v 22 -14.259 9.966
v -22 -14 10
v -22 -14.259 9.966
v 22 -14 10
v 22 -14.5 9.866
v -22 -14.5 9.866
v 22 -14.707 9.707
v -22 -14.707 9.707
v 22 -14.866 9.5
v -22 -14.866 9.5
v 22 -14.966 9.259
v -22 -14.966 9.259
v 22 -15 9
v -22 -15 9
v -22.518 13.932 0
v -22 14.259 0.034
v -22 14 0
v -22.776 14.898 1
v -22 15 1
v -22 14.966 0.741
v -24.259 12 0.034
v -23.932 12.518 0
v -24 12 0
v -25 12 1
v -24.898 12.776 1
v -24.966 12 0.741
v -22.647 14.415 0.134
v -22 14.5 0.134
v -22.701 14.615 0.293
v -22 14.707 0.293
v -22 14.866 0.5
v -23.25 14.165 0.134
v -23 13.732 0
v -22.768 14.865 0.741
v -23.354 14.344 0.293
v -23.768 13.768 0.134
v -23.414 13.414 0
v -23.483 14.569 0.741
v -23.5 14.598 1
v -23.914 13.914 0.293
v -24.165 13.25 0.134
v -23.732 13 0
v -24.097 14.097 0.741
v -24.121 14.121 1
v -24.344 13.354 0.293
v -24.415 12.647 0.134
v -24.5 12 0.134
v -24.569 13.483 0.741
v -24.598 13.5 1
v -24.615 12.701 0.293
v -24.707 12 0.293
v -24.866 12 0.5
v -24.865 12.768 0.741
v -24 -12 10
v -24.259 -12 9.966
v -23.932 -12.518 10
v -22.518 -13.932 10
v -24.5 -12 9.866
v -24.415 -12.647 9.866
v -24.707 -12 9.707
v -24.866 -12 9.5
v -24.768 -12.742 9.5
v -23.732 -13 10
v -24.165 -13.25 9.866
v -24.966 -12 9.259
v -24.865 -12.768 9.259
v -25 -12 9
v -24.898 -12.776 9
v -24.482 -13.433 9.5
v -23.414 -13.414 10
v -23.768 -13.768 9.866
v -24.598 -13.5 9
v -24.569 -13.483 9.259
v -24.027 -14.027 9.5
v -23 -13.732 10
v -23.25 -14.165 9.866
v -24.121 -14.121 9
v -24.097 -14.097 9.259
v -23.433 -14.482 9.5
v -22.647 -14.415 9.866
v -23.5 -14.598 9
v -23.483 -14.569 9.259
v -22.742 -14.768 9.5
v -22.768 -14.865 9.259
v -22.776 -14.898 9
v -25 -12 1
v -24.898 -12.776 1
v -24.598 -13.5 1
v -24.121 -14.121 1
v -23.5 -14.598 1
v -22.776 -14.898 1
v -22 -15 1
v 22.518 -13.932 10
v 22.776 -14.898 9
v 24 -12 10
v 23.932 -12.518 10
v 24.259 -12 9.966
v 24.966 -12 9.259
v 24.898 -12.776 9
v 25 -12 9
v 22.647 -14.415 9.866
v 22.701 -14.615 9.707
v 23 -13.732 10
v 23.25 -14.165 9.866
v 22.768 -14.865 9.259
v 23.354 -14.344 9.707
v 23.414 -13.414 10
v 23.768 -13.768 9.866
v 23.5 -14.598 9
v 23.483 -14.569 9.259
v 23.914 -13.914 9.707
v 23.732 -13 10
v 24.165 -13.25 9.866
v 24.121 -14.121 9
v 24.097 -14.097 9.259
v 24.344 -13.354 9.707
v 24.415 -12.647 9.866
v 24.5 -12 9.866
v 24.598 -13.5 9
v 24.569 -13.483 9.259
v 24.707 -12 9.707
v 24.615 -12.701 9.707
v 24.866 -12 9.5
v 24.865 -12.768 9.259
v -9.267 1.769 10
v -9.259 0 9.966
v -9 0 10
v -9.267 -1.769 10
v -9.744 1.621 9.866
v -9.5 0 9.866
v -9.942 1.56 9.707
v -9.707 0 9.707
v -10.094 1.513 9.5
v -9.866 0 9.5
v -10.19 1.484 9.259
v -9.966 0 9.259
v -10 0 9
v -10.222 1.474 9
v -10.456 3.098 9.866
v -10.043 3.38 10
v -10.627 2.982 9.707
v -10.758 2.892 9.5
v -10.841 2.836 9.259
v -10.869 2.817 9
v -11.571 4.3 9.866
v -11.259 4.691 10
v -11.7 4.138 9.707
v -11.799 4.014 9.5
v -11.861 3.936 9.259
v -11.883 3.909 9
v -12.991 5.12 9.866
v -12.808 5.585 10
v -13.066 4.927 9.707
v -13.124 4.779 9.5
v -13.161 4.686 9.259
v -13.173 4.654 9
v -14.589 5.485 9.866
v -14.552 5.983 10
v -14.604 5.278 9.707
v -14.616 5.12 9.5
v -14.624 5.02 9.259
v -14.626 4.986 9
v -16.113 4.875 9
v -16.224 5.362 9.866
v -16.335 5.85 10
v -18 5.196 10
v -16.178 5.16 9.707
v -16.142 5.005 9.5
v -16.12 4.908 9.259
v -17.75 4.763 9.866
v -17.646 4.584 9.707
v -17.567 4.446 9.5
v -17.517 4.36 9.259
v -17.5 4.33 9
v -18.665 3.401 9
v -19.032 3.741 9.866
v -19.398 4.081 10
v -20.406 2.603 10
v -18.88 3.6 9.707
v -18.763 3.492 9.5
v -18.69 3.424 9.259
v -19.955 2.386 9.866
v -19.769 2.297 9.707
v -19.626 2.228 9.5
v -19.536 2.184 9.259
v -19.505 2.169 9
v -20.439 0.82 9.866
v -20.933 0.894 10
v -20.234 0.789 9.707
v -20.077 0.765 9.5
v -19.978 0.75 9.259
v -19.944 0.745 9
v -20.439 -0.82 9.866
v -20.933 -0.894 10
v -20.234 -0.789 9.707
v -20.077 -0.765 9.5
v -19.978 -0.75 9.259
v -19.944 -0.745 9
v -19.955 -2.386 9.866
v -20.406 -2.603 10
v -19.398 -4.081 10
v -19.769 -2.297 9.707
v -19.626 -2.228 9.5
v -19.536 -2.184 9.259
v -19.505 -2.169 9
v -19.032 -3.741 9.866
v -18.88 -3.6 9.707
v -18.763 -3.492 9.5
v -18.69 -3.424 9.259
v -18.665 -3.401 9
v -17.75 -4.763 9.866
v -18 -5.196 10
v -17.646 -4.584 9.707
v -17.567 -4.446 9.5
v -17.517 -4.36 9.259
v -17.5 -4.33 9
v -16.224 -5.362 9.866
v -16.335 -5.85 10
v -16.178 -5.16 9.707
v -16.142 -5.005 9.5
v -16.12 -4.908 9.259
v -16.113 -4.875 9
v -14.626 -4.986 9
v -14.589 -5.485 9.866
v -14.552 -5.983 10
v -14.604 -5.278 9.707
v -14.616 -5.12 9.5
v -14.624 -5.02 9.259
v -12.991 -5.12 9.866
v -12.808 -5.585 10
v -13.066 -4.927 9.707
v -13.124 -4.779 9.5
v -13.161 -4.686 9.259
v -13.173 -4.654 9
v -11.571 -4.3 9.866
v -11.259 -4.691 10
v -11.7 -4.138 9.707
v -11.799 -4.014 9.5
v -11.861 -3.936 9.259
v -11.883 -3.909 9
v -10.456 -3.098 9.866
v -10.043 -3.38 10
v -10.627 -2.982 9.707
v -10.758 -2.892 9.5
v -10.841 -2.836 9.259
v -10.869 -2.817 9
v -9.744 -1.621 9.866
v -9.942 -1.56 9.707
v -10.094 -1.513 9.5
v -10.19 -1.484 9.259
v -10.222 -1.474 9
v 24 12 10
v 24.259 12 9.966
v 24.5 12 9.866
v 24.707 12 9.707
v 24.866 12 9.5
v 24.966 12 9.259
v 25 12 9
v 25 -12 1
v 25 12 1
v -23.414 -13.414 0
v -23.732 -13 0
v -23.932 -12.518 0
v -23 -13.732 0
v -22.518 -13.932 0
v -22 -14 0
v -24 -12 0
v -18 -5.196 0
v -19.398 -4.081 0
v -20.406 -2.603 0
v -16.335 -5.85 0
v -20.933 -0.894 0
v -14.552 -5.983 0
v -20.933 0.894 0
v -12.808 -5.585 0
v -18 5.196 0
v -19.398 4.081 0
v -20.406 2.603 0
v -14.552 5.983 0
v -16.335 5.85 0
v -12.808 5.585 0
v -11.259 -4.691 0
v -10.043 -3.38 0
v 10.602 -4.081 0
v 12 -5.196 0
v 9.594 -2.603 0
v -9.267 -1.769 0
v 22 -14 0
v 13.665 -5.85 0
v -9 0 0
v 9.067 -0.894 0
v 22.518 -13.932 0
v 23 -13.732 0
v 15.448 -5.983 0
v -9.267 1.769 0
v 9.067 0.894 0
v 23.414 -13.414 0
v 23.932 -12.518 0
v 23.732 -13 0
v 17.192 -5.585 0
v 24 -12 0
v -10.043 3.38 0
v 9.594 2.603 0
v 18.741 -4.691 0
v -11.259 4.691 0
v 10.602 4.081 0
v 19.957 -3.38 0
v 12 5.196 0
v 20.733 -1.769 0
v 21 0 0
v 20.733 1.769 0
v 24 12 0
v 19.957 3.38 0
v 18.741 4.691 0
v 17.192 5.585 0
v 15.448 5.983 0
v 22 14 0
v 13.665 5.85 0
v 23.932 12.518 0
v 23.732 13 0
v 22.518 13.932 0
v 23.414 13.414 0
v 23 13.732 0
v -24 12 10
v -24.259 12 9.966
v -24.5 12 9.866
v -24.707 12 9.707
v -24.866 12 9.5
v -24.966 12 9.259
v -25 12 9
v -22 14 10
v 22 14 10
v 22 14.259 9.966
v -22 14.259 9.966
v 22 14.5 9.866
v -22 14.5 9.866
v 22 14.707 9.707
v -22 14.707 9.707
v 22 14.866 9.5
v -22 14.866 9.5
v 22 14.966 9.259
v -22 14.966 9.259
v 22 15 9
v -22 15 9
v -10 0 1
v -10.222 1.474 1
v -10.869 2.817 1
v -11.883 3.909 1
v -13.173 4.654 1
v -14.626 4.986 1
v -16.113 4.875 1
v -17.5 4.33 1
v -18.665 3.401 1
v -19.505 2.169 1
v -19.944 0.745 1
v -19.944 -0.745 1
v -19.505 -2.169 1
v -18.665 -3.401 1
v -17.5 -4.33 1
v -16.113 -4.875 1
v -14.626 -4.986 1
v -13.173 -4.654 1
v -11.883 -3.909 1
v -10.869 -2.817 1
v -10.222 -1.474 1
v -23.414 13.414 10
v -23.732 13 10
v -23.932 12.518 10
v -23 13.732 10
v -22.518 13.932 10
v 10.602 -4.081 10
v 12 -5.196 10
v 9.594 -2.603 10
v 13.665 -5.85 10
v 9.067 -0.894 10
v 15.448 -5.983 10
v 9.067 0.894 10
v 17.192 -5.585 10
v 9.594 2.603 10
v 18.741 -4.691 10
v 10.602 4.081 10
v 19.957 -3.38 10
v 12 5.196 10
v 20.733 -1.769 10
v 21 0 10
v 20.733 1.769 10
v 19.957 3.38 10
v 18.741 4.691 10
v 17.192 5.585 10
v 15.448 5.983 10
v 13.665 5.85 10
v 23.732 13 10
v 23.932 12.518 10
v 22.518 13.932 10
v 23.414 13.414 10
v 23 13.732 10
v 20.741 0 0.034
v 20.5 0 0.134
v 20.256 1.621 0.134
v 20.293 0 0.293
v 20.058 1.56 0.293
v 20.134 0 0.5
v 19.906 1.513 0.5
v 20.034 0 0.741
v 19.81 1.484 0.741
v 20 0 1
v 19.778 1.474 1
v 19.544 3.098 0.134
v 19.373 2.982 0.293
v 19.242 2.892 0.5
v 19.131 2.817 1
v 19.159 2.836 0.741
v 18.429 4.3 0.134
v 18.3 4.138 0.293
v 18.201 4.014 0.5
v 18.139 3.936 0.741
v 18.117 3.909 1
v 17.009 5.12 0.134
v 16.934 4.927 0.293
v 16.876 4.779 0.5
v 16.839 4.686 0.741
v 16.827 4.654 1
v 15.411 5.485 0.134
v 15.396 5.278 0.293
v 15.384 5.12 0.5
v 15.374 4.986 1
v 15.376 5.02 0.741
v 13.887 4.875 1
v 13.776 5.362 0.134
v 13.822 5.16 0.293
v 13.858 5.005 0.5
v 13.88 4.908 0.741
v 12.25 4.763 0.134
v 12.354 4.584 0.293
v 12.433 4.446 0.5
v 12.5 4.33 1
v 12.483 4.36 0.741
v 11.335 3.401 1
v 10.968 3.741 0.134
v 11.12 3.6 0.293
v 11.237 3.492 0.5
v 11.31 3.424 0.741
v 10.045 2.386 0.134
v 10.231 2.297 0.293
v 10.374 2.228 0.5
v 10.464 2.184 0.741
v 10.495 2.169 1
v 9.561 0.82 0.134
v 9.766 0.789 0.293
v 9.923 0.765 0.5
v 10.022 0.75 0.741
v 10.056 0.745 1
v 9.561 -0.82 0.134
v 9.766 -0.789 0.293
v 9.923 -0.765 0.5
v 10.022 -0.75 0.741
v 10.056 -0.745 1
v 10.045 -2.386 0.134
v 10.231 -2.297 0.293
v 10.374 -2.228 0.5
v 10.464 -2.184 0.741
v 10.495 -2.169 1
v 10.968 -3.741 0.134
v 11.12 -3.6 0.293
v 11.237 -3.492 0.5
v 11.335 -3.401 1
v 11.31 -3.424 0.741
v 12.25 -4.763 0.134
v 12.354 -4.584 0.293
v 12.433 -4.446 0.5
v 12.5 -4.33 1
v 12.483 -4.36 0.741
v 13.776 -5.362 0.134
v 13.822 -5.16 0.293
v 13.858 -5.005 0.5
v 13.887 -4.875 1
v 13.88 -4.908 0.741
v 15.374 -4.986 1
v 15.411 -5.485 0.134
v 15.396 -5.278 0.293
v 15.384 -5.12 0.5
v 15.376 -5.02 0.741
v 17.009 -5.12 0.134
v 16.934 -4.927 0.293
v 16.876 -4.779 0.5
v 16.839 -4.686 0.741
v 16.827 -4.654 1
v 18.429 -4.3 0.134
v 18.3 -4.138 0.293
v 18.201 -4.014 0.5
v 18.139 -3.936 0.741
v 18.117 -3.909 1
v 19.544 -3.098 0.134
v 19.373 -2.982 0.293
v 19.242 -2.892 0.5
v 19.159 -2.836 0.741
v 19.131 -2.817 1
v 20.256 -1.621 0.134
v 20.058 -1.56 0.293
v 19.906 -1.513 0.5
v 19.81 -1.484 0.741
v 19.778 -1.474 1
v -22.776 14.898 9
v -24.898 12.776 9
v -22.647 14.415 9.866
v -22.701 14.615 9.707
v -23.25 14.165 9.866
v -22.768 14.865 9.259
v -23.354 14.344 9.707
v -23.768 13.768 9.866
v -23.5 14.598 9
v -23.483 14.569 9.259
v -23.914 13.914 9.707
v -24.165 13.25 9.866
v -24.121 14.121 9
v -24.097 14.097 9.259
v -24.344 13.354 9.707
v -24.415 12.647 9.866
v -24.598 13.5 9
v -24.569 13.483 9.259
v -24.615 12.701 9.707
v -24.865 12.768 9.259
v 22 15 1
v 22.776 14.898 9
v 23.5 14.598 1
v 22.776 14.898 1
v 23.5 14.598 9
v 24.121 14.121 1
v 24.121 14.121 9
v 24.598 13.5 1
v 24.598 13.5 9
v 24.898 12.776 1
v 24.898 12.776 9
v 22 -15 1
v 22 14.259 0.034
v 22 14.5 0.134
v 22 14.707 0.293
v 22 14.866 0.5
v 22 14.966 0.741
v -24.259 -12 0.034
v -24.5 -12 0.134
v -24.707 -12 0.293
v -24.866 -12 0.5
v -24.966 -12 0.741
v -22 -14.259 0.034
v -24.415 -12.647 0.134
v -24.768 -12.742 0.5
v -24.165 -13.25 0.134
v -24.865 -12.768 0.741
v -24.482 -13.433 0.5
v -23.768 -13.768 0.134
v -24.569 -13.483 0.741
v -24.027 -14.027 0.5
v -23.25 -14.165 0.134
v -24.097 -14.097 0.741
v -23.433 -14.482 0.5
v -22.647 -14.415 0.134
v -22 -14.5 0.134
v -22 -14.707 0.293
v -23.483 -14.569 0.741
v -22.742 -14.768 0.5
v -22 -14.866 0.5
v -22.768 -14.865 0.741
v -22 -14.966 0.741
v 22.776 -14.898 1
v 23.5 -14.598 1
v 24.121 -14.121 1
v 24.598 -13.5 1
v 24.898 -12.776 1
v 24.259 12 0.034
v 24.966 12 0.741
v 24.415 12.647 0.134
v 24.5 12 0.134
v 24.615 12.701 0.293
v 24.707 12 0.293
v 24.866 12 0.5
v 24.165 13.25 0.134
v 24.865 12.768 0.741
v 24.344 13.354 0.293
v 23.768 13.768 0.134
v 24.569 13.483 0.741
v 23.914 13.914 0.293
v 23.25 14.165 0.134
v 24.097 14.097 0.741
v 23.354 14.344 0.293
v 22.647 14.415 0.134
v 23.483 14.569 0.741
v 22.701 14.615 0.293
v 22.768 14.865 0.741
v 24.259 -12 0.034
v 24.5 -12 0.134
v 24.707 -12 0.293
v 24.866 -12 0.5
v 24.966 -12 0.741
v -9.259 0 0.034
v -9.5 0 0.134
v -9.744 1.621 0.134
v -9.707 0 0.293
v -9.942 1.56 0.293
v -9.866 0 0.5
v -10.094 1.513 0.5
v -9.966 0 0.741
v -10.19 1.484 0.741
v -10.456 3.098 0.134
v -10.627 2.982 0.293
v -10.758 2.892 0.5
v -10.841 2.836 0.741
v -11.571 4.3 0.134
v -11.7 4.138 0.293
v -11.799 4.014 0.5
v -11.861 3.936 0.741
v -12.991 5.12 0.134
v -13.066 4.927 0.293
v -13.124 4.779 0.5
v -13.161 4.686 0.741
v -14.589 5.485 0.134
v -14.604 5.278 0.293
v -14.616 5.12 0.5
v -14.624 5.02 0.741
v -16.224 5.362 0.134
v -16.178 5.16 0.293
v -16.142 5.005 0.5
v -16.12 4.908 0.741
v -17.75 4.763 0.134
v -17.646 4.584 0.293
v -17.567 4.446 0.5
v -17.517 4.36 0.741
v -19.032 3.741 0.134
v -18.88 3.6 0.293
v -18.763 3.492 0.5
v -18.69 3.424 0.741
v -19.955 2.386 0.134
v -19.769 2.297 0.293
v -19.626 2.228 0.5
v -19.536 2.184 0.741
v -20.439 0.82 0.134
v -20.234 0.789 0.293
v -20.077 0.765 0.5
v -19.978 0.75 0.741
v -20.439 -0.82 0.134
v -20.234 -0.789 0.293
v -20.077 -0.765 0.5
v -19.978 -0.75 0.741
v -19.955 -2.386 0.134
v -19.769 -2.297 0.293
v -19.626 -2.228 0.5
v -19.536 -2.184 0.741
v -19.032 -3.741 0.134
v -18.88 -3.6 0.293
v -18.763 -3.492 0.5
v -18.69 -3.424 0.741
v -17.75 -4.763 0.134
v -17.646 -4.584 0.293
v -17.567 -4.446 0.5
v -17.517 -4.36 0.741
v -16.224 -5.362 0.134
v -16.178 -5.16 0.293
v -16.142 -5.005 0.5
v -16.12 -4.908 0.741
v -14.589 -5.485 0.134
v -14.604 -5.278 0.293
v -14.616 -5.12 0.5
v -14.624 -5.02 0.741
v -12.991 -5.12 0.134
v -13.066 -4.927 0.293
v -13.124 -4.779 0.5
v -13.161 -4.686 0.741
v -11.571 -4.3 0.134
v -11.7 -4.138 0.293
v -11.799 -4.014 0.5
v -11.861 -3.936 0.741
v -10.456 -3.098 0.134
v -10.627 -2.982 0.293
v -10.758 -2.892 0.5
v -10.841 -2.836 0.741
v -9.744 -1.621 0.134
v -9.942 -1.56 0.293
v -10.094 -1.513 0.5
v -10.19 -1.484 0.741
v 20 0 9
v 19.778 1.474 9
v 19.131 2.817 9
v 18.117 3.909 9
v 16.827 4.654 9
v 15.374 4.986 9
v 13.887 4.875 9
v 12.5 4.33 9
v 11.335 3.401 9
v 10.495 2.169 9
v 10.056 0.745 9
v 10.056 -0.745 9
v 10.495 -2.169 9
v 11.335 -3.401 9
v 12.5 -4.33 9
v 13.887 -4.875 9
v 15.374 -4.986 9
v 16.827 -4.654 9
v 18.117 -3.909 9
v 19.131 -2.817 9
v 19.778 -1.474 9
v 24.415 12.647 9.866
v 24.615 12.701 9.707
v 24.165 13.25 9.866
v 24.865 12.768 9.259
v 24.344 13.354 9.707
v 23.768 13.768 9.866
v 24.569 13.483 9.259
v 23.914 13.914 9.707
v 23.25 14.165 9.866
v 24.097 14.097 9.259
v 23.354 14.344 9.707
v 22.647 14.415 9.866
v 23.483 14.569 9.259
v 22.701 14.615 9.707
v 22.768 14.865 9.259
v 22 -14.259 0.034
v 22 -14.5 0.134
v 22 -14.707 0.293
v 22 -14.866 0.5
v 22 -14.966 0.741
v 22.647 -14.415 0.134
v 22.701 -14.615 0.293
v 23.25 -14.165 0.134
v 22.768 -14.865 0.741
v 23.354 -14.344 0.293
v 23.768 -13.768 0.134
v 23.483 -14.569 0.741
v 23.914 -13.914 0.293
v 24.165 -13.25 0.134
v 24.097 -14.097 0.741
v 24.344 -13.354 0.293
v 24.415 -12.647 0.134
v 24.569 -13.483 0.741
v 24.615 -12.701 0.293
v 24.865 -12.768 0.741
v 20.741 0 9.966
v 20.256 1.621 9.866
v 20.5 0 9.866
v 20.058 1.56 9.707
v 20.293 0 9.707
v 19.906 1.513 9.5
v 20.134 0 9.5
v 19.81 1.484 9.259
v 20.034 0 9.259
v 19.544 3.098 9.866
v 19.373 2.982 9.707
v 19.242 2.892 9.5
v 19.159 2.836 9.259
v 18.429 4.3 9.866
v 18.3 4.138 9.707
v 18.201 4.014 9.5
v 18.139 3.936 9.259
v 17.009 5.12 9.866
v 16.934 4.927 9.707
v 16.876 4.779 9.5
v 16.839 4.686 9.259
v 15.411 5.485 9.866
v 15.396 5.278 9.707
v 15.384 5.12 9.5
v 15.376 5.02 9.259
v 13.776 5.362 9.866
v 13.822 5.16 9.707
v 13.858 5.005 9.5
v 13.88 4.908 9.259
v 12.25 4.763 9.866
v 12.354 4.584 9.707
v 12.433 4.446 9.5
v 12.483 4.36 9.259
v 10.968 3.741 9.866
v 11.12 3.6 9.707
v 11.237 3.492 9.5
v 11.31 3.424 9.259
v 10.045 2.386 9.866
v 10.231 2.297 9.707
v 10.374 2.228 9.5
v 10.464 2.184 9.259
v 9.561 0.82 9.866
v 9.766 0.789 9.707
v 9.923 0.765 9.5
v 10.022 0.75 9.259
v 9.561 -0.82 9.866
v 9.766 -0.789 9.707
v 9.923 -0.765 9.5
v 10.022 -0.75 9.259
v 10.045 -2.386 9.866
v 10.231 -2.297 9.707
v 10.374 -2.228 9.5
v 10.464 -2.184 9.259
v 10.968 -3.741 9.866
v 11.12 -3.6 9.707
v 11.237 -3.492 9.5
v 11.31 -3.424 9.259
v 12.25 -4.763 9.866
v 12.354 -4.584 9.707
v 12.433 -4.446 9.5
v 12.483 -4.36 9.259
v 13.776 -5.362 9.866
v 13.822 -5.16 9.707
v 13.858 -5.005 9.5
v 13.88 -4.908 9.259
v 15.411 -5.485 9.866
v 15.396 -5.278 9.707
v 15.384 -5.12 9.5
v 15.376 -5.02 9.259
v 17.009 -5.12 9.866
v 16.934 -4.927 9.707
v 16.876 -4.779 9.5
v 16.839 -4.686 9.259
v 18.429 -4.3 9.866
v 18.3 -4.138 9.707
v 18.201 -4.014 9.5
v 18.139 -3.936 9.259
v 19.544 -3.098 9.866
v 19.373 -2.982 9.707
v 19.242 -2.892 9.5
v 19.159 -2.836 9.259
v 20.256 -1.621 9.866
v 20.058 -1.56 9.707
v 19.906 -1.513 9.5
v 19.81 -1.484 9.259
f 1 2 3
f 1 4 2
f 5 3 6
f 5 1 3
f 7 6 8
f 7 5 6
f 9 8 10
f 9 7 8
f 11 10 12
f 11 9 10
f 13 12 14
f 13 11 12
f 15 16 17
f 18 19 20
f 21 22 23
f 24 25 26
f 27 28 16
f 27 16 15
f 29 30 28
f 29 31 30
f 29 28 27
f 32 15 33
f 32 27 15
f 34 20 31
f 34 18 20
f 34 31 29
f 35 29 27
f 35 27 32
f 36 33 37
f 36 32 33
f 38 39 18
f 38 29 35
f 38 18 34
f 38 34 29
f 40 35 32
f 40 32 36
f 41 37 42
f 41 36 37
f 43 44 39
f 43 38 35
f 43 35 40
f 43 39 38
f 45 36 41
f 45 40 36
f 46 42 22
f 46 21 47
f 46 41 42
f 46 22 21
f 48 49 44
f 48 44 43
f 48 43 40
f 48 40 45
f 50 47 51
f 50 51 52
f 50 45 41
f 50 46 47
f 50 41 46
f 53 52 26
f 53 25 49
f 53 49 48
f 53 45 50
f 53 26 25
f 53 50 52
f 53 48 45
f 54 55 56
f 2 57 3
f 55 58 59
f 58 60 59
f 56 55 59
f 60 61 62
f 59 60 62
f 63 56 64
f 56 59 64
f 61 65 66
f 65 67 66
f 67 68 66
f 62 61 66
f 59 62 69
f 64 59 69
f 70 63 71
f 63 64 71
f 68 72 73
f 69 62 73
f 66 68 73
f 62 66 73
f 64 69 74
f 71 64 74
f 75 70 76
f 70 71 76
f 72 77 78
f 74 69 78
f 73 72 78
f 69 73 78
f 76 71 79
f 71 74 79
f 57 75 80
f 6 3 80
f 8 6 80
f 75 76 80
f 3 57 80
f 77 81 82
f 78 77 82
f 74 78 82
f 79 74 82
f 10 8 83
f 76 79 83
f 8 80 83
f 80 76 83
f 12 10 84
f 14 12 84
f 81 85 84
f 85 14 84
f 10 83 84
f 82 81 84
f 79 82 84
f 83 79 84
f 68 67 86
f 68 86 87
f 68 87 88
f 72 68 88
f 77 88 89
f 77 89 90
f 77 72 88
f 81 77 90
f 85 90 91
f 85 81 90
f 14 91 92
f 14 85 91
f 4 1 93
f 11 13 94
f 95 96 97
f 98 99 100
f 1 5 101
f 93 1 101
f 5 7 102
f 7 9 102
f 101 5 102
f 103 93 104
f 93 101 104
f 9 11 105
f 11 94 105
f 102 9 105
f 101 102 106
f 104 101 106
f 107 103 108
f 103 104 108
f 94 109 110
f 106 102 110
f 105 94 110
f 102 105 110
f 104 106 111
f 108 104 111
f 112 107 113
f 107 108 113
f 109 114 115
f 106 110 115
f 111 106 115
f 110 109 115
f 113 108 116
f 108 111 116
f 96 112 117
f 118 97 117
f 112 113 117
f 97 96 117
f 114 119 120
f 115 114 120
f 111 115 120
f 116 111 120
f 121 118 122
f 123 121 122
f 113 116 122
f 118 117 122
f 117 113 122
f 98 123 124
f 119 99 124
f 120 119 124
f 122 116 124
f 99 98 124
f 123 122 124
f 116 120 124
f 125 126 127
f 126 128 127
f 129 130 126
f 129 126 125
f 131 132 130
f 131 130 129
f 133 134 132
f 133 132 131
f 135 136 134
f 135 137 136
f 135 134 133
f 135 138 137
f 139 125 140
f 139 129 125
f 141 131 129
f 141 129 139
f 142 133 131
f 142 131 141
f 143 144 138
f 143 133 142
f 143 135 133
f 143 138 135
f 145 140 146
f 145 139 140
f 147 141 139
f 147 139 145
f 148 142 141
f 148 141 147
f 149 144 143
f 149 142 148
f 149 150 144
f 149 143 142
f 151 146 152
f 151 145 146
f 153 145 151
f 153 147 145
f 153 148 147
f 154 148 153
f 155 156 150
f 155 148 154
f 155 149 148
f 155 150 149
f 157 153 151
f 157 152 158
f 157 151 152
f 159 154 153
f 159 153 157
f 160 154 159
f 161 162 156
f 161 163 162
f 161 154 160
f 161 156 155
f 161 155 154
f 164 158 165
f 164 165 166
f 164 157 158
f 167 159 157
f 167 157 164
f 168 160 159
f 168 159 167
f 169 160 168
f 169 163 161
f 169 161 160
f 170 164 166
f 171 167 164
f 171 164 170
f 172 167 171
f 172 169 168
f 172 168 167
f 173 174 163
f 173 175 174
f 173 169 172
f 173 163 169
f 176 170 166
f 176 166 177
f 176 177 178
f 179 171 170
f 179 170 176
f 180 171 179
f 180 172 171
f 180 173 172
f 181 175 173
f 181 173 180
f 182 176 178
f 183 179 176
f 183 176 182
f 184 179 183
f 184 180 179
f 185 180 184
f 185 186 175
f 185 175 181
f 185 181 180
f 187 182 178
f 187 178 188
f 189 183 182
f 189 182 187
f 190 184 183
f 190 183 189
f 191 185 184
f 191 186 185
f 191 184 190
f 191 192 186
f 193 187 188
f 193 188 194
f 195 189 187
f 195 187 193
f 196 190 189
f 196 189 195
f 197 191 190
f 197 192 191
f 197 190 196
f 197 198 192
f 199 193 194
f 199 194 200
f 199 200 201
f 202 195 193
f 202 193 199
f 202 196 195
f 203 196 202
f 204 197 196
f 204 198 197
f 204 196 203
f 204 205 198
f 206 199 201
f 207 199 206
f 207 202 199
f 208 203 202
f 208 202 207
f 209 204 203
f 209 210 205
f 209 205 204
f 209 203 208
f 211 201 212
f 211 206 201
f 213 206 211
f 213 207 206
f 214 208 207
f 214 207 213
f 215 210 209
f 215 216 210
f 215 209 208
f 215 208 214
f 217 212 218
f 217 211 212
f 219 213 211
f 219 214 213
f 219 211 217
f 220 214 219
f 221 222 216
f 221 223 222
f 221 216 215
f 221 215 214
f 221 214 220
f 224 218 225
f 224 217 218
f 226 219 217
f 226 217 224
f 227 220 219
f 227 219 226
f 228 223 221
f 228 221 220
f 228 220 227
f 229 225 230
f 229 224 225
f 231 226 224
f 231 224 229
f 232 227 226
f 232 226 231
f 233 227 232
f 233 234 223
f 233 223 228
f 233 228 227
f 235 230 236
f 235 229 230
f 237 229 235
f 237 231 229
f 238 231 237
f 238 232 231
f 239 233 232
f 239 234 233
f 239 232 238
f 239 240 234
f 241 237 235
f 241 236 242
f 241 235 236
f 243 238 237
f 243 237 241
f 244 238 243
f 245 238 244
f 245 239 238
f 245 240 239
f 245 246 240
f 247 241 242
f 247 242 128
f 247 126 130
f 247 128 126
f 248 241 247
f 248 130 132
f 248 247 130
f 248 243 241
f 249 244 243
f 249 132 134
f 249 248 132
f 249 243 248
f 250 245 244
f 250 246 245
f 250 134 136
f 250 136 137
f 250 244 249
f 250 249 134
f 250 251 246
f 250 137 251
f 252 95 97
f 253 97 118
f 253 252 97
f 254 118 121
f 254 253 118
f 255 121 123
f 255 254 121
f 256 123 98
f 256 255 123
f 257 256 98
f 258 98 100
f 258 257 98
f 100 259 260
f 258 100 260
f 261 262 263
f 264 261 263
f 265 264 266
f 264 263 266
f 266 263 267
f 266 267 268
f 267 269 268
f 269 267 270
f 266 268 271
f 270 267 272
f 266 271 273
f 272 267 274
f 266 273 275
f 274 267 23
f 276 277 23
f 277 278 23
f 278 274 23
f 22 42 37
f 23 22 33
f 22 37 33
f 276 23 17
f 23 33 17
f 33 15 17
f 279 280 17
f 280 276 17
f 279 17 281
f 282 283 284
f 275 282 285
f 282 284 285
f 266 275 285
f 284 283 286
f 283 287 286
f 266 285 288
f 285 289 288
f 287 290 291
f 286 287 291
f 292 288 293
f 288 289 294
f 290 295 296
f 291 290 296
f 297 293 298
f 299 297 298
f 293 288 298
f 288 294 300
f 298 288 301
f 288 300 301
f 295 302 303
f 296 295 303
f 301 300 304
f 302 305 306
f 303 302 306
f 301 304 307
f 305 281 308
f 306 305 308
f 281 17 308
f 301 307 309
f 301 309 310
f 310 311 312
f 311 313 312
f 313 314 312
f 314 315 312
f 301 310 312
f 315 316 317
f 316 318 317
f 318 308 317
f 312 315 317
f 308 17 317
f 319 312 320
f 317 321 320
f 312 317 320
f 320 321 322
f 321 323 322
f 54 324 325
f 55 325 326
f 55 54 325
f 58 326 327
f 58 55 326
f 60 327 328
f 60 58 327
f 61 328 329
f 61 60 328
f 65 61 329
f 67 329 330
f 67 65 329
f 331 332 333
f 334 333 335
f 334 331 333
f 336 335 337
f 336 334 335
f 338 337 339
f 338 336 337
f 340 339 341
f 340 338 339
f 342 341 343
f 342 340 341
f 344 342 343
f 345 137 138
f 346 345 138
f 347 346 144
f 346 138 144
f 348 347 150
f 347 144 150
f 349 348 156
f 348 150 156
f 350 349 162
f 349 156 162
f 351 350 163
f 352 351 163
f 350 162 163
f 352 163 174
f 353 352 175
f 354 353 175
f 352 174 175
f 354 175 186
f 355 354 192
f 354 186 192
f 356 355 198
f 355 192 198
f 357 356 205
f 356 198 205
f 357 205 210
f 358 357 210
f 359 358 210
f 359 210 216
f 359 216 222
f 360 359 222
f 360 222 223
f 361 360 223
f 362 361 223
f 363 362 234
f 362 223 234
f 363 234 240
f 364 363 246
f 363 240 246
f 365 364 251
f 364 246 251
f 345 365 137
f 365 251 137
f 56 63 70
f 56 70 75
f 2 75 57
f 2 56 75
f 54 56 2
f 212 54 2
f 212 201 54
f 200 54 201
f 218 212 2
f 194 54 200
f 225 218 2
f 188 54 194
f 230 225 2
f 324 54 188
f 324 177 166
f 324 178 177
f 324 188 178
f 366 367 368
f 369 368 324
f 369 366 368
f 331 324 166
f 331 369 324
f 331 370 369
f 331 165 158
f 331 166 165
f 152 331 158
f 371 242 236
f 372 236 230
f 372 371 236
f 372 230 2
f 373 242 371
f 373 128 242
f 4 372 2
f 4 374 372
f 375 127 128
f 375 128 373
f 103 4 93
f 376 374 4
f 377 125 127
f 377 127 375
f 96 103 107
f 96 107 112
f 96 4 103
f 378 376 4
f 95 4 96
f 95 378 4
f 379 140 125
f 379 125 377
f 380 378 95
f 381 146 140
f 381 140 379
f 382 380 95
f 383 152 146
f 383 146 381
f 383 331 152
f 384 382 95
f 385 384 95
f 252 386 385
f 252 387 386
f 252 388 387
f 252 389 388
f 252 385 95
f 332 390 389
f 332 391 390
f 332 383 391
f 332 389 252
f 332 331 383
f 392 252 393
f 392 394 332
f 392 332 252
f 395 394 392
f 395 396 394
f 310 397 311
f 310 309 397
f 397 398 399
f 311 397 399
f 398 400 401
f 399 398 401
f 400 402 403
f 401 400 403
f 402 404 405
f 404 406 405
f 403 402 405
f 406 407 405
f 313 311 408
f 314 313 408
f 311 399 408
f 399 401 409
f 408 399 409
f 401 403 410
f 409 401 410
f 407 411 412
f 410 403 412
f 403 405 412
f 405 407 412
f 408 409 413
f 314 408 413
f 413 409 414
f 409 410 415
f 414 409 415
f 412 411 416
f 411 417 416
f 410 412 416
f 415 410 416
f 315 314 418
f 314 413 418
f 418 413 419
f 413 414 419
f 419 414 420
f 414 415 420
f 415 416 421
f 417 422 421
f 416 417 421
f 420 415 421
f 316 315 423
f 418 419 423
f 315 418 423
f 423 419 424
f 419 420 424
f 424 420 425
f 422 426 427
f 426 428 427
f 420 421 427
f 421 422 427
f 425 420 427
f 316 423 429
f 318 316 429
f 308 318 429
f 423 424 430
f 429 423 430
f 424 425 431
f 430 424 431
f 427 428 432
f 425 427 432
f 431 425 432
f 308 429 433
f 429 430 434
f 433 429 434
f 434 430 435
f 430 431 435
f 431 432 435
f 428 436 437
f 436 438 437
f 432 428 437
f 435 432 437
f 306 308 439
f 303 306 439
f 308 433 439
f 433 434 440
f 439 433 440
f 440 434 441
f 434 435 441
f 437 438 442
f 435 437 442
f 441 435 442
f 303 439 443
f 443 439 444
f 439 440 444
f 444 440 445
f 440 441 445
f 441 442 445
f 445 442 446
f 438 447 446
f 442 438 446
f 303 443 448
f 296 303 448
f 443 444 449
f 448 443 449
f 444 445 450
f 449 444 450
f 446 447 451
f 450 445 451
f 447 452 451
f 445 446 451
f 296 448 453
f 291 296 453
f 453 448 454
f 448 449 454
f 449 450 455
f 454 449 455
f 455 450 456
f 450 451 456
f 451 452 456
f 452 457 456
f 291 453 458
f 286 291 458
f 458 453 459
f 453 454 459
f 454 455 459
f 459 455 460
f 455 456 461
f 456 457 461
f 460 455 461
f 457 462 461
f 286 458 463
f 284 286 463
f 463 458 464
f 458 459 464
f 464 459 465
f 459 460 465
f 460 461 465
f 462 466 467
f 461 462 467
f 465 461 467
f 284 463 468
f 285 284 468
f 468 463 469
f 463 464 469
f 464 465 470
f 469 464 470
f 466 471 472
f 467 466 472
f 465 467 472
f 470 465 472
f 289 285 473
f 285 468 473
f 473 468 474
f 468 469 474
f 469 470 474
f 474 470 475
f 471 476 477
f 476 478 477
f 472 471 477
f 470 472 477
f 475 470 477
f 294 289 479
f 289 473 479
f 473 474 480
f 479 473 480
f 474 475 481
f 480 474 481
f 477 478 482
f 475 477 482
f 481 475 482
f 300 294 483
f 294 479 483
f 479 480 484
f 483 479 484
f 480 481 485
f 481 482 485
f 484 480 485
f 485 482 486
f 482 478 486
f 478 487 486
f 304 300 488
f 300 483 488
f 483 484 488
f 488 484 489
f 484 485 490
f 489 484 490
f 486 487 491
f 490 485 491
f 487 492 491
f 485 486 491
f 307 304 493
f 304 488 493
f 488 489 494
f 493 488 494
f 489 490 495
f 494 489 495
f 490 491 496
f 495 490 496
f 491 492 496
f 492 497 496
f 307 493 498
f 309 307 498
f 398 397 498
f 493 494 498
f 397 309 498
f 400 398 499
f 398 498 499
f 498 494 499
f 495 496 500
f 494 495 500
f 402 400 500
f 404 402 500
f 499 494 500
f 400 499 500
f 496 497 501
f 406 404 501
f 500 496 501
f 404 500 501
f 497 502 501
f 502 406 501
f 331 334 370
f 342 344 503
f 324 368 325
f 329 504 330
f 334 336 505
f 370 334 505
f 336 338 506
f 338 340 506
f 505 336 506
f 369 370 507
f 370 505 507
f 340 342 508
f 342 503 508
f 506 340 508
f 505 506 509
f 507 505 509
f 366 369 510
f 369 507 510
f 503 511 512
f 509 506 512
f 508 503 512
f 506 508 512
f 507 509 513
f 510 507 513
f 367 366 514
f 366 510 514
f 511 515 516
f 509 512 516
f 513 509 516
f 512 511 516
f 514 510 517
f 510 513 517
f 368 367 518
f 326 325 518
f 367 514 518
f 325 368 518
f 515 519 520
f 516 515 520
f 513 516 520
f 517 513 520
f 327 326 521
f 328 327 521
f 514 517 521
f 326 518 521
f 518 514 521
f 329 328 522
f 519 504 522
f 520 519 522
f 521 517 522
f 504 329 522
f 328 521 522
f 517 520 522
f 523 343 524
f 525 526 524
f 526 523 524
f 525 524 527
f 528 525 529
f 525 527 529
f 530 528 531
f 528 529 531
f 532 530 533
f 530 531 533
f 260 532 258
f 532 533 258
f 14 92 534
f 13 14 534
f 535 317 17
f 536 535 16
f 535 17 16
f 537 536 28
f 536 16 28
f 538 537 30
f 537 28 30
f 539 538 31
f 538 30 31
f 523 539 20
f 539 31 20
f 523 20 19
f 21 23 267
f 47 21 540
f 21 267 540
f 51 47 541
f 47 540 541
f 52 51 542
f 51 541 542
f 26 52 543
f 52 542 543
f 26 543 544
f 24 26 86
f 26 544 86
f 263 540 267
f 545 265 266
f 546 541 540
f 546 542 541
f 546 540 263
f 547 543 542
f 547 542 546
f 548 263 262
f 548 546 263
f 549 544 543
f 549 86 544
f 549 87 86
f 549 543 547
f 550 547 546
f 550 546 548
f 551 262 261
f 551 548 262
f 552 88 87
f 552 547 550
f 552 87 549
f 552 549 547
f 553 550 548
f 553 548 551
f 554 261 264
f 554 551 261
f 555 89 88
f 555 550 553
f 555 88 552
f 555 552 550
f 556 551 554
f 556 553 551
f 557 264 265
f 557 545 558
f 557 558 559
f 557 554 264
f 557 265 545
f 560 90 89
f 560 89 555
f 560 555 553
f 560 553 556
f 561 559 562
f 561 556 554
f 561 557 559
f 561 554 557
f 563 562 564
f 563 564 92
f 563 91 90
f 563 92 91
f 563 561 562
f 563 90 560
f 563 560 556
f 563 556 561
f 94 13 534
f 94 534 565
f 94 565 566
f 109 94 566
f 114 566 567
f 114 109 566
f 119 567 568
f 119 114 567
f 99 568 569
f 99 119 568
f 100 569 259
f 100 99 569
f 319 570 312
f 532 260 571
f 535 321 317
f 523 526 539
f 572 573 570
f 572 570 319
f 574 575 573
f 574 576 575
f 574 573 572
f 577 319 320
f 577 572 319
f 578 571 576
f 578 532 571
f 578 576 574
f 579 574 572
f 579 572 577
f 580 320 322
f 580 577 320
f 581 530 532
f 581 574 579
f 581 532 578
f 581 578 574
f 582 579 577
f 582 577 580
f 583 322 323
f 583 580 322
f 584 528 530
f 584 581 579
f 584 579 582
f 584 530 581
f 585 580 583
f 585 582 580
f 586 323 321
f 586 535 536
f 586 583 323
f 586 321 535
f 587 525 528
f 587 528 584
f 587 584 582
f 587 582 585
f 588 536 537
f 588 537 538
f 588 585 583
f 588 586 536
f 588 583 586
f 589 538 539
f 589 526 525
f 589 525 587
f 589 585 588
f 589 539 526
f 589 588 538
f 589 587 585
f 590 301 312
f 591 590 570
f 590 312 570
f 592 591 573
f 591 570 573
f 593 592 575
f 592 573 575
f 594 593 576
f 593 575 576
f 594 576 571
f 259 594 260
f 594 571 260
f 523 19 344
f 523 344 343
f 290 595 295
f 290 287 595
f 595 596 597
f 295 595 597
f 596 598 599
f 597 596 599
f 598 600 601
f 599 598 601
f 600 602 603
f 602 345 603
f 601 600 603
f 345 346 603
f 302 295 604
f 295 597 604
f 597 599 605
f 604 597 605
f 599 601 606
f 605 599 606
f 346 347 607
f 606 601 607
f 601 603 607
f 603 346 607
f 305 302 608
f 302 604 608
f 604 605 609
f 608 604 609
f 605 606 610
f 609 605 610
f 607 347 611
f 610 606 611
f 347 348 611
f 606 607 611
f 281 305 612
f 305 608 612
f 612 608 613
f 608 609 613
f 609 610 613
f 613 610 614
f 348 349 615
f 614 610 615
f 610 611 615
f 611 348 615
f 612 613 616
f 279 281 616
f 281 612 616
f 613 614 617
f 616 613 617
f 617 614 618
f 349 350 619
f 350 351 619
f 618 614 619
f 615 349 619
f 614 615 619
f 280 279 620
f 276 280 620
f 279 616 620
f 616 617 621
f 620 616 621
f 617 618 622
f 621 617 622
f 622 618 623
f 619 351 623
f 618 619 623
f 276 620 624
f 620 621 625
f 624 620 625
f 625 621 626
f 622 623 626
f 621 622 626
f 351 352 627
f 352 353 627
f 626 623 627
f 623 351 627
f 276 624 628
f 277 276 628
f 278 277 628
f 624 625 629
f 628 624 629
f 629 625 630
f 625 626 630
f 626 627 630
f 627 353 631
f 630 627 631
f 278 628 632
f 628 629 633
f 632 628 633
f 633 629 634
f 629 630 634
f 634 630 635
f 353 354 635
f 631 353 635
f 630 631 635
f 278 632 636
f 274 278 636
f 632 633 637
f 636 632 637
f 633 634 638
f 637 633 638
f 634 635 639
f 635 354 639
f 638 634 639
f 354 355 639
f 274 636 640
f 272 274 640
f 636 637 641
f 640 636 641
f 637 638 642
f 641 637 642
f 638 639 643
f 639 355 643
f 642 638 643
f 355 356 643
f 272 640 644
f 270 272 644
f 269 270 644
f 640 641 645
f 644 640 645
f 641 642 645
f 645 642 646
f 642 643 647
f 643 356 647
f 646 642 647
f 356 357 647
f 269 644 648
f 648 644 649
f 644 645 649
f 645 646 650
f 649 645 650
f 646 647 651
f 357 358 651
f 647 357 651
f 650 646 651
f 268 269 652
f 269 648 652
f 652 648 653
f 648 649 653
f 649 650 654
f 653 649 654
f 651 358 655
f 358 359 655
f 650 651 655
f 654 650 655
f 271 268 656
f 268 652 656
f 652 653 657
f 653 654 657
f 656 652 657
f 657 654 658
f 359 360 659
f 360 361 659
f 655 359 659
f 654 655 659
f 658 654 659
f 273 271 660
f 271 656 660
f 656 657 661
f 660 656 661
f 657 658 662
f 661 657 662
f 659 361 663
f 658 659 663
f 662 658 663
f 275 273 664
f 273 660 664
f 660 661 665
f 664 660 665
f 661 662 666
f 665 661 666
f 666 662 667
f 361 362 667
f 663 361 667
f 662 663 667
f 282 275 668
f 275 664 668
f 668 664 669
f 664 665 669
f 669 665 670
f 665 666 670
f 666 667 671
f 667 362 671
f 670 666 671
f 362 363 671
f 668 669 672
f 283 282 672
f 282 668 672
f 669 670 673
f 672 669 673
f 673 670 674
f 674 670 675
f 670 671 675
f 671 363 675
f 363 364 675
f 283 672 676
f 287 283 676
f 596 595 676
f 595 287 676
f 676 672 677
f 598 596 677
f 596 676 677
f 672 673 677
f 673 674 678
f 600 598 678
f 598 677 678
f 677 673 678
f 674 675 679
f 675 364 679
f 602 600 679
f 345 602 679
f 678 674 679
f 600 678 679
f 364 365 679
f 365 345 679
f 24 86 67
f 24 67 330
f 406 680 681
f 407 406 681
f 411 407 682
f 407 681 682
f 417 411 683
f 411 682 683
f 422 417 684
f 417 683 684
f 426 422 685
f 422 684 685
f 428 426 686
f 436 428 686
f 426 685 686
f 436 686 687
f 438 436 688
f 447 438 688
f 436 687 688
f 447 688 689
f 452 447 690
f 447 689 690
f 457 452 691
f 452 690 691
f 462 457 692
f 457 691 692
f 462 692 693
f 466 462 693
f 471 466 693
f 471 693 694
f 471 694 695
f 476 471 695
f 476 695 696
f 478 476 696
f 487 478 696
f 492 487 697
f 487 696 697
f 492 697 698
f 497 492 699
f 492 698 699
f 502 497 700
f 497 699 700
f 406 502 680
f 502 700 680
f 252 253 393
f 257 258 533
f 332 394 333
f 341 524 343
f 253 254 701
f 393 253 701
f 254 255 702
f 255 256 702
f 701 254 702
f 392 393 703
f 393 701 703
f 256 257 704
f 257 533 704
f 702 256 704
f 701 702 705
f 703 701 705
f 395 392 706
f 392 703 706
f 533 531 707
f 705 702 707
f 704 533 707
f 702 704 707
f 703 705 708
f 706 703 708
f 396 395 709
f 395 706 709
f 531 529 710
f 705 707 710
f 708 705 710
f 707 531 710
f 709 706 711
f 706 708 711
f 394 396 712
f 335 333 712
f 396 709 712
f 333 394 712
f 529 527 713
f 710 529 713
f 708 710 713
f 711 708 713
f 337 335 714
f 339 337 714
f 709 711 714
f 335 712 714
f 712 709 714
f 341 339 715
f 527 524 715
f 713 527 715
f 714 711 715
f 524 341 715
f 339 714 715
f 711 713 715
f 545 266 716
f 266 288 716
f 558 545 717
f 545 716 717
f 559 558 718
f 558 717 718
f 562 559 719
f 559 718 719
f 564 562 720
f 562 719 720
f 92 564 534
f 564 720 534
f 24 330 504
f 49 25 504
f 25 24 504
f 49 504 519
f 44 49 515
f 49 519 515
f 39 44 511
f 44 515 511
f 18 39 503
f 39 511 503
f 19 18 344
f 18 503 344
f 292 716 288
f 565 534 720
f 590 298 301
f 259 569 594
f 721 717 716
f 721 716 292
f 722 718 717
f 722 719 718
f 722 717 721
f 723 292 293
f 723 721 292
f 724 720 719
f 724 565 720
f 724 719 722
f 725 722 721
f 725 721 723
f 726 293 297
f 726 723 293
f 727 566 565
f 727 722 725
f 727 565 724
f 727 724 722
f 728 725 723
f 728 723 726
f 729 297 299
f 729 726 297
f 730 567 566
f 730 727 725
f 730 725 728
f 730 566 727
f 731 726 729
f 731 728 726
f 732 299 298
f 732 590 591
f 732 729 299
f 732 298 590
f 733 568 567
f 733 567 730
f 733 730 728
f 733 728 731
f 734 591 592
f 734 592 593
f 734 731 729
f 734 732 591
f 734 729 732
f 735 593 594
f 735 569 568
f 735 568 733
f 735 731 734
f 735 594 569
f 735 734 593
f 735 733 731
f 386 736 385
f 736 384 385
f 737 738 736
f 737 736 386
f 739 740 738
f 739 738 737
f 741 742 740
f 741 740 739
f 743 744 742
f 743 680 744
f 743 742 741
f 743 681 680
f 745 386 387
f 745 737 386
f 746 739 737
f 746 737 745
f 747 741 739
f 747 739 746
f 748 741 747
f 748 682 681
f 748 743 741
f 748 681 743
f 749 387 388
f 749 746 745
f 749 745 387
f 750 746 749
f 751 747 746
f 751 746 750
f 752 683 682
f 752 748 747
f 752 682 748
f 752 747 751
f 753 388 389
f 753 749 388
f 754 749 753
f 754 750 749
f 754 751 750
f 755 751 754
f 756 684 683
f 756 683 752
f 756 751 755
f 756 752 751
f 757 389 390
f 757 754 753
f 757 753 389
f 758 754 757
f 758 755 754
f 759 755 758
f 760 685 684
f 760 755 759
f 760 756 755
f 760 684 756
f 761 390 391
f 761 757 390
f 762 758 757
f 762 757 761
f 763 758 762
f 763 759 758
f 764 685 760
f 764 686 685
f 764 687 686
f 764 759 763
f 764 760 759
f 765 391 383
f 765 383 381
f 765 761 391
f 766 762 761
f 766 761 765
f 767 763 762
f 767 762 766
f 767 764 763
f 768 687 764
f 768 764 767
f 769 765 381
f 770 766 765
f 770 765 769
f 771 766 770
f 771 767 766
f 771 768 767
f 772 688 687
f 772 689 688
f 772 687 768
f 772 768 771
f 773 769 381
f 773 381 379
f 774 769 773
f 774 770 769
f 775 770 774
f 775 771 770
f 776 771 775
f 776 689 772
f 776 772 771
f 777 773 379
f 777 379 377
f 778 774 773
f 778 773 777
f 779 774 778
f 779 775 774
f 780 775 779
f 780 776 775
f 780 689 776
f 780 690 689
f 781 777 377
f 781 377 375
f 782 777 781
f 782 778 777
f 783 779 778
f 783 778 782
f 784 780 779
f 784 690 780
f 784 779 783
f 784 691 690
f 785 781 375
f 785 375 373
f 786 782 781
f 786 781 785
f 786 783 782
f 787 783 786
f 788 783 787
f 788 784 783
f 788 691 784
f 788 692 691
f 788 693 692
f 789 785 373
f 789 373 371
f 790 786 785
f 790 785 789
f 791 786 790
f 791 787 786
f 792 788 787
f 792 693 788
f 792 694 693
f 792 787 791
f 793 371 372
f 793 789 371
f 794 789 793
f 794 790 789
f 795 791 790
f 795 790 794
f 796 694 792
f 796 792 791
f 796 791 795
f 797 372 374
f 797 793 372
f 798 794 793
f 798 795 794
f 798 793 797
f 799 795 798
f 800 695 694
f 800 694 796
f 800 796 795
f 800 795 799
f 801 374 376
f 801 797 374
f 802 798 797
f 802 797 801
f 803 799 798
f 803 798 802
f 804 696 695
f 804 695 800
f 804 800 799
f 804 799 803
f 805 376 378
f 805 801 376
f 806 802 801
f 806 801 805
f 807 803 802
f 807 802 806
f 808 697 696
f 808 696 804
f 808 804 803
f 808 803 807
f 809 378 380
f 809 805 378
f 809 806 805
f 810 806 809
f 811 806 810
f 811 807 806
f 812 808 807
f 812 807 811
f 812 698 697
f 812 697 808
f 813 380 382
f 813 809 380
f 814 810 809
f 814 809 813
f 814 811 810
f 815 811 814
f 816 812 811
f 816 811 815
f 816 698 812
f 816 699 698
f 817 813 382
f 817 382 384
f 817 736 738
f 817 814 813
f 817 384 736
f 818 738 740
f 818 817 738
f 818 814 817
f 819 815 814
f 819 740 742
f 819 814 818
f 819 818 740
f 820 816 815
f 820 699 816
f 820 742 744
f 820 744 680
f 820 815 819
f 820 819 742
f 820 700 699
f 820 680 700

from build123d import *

# Parameters (mm, degrees)
SKETCH1_W           = 50
SKETCH1_H           = 30
BOSS_EXTRUDE1_DEPTH = 10
SKETCH2_R           = 5
CUT_EXTRUDE1_DEPTH  = 10
FILLET1_R           = 3
FILLET2_R           = 1


with BuildPart() as part:
    # Sketch1 → Boss-Extrude1 (new body)
    with BuildSketch(Plane.XY):
        Rectangle(SKETCH1_W, SKETCH1_H)
    extrude(amount=BOSS_EXTRUDE1_DEPTH)

    # Sketch2 → Cut-Extrude1 (cut)
    with BuildSketch(Plane.XY.offset(10)):
        with Locations((-15, 0)):
            Circle(SKETCH2_R)
        with Locations((15, 0)):
            Circle(SKETCH2_R)
    extrude(amount=-CUT_EXTRUDE1_DEPTH, mode=Mode.SUBTRACT)

    # Fillet1
    fillet1_edges = [part.edges().sort_by_distance(p)[0] for p in [
        (-25, 15, 5),
        (25, 15, 5),
        (25, -15, 5),
        (-25, -15, 5),
    ]]
    fillet(fillet1_edges, radius=FILLET1_R)

    # Fillet2
    fillet2_edges = [part.edges().sort_by_distance(p)[0] for p in [
        (-20, 0, 0),
        (-20, 0, 10),
        (10, 0, 0),
        (10, 0, 10),
        (0, -15, 0),
        (0, -15, 10),
        (-25, 0, 0),
        (0, 15, 0),
        (25, 0, 0),
        (24.121320344, 14.121320344, 0),
        (-24.121320344, 14.121320344, 0),
        (24.121320344, -14.121320344, 0),
        (-24.121320344, -14.121320344, 0),
        (-25, 0, 10),
        (25, 0, 10),
        (0, 15, 10),
        (24.121320344, 14.121320344, 10),
        (-24.121320344, 14.121320344, 10),
        (24.121320344, -14.121320344, 10),
        (-24.121320344, -14.121320344, 10),
    ]]
    fillet(fillet2_edges, radius=FILLET2_R)


solid = part.part
